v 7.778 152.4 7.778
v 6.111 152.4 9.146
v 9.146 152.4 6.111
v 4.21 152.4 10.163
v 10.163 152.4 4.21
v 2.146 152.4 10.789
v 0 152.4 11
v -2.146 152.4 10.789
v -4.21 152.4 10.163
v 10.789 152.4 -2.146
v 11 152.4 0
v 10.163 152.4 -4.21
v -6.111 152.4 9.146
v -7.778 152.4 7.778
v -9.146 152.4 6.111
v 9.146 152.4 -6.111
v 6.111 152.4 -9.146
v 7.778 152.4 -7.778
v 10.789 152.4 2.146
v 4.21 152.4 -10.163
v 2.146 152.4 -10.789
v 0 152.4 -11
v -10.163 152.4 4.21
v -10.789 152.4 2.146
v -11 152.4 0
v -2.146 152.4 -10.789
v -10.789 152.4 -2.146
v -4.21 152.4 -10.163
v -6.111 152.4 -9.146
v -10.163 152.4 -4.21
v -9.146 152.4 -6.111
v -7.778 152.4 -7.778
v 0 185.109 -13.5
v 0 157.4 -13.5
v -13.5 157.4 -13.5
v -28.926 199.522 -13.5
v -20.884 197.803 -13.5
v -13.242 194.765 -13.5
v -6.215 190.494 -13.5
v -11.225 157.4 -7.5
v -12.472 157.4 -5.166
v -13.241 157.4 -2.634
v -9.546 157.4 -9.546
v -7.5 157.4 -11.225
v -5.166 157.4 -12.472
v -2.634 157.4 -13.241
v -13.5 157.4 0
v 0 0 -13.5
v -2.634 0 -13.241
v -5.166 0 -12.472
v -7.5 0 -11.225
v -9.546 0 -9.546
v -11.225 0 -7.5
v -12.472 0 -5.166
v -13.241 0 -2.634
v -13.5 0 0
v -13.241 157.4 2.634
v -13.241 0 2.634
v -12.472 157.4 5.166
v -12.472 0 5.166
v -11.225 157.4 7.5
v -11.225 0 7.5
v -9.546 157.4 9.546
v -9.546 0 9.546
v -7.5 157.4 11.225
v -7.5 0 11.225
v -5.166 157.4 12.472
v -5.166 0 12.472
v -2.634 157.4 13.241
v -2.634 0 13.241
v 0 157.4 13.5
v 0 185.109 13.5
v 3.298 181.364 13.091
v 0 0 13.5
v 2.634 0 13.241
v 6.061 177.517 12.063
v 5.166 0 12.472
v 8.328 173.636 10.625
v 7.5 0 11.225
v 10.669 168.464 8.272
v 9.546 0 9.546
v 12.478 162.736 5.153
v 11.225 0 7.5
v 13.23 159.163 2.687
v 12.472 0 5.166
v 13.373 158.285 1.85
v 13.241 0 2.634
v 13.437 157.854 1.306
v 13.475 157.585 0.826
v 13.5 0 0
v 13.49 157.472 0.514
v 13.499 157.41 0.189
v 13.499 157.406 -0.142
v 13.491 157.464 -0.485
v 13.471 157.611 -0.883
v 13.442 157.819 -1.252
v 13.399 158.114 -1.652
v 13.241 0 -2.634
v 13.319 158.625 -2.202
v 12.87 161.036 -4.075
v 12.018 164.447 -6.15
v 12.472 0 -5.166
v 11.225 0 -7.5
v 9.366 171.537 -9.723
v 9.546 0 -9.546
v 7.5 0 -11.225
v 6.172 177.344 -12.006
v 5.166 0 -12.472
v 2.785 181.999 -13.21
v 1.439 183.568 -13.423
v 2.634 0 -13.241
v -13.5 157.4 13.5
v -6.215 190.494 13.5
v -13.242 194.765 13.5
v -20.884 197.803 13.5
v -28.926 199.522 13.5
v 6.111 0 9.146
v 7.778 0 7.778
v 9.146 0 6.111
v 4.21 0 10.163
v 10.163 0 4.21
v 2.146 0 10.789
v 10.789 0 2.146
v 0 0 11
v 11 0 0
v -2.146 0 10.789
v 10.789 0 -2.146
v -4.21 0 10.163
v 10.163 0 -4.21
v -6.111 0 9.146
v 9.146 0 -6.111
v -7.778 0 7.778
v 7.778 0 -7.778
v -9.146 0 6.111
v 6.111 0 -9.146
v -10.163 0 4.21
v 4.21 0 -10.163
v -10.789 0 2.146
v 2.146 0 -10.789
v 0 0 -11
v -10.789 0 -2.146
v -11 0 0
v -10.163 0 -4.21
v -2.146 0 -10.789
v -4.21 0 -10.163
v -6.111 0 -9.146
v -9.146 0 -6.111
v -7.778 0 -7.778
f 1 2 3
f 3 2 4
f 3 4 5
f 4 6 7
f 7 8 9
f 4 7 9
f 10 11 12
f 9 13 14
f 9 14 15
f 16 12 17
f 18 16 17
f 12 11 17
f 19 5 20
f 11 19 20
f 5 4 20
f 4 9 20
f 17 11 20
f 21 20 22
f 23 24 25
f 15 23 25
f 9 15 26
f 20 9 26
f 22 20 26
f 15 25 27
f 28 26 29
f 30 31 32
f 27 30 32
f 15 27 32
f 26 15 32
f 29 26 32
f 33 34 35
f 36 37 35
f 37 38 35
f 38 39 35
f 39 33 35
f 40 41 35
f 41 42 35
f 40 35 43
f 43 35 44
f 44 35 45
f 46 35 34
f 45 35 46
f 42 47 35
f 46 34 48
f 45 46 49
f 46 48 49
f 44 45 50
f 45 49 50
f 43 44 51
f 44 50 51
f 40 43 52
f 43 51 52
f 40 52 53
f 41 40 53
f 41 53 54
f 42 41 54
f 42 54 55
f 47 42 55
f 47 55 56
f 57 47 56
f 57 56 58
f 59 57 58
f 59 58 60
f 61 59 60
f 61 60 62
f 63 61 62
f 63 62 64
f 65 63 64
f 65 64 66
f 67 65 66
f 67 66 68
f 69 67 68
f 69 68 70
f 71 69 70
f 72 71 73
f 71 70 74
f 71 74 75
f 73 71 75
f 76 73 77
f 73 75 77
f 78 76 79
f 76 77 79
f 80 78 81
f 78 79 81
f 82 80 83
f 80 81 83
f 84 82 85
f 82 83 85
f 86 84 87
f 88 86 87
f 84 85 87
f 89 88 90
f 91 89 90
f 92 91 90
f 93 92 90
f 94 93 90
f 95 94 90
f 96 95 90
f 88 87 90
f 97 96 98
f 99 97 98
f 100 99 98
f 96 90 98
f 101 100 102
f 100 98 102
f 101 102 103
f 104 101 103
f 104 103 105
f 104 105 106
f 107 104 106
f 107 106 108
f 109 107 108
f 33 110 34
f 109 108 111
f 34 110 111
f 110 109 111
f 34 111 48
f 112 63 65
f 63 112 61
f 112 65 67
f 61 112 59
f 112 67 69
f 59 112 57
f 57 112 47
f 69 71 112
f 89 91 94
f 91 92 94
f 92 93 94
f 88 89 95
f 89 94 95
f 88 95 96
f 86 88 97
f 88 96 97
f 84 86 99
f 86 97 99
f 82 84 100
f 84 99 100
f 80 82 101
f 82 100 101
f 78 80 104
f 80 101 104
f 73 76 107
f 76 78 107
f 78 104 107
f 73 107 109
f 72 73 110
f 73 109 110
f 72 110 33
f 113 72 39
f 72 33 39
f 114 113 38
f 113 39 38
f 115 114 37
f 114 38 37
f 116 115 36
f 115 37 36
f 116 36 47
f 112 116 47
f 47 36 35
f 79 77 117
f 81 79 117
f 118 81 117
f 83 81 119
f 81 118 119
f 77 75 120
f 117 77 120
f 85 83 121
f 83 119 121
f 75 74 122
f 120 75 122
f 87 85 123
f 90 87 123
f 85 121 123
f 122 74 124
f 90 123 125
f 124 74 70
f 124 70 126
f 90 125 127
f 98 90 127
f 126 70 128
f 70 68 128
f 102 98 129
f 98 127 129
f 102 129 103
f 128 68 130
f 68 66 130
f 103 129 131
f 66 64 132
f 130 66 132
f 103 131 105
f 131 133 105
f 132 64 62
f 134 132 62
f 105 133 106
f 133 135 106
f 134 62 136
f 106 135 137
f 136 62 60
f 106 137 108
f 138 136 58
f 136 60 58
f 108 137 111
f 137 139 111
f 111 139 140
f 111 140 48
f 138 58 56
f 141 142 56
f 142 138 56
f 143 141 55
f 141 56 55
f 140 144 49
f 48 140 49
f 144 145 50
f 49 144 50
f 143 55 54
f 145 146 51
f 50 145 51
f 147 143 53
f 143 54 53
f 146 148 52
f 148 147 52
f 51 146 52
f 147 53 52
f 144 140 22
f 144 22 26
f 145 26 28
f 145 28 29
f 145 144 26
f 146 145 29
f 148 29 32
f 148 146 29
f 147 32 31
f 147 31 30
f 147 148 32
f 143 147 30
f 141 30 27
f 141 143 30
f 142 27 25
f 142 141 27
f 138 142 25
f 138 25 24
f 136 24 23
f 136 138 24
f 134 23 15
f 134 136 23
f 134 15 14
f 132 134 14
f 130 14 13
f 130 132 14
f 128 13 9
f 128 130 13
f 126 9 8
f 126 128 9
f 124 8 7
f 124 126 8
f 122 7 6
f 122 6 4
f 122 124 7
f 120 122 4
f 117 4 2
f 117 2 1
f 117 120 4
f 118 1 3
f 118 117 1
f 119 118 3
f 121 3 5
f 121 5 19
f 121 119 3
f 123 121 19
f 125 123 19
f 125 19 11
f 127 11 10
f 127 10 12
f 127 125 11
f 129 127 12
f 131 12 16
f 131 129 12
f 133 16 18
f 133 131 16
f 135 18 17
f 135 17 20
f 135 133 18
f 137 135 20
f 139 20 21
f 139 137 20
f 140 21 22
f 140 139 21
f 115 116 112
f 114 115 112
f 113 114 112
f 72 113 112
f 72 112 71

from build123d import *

# Parameters (mm, degrees)
SKETCH1_R                = 13.5
SKETCH1_R_2              = 11
BOSS_EXTRUDE1_DEPTH      = 152.4
SKETCH2_R                = 13.5
BOSS_EXTRUDE2_DEPTH      = 5
BOSS_EXTRUDE3_DEPTH      = 15
BOSS_EXTRUDE3_DEPTH_BACK = 15
CUT_EXTRUDE3_DEPTH       = 60


with BuildPart() as part:
    # Sketch1 → Boss-Extrude1 (new body)
    with BuildSketch(Plane(origin=(0, 0, 0), x_dir=(1, 0, 0), z_dir=(0, 1, 0))):
        Circle(SKETCH1_R)
        Circle(SKETCH1_R_2, mode=Mode.SUBTRACT)
    extrude(amount=BOSS_EXTRUDE1_DEPTH)

    # Sketch2 → Boss-Extrude2 (add)
    with BuildSketch(Plane(origin=(0, 152.4, 0), x_dir=(1, 0, 0), z_dir=(0, 1, 0))):
        Circle(SKETCH2_R)
    extrude(amount=BOSS_EXTRUDE2_DEPTH)

    # Sketch4 → Boss-Extrude3 (add, two sides: drawn at the far end of the back side and taken through both)
    with BuildSketch(Plane.XY.offset(-BOSS_EXTRUDE3_DEPTH_BACK)):
        with BuildLine():
            Line((-11.023106703, 157.4), (13.5, 157.4))
            ThreePointArc((13.5, 157.4), (-0.556148669, 185.669720677), (-28.926428084, 199.52178437))
            Line((-28.926428084, 199.52178437), (-13.5, 157.4))
            Line((-13.5, 157.4), (-11.023106703, 157.4))
        make_face()
    extrude(amount=BOSS_EXTRUDE3_DEPTH + BOSS_EXTRUDE3_DEPTH_BACK)

    # Sketch6 → Cut-Extrude3 (cut)
    with BuildSketch(Plane.XZ.offset(-157.4)):
        with BuildLine():
            Line((0, -13.5), (-22.831524923, -13.5))
            Line((-22.831524923, -13.5), (-32.31073418, -13.5))
            Line((-32.31073418, -13.5), (-41.113501084, -13.5))
            Line((-41.113501084, -13.5), (-41.113501084, -20.862107507))
            Line((-41.113501084, -20.862107507), (-22.423580549, -20.091260403))
            Line((-22.423580549, -20.091260403), (15.387763585, -20.091260403))
            Line((15.387763585, -20.091260403), (15.387763585, 20.06576388))
            Line((15.387763585, 20.06576388), (-22.423580549, 20.06576388))
            Line((-22.423580549, 20.06576388), (-41.113501084, 20.06576388))
            Line((-41.113501084, 20.06576388), (-41.553103928, 13.317013583))
            Line((-41.553103928, 13.317013583), (-30.569316507, 13.5))
            Line((-30.569316507, 13.5), (0, 13.5))
            ThreePointArc((0, 13.5), (13.5, 0), (0, -13.5))
        make_face()
    extrude(amount=-CUT_EXTRUDE3_DEPTH, mode=Mode.SUBTRACT)


solid = part.part
